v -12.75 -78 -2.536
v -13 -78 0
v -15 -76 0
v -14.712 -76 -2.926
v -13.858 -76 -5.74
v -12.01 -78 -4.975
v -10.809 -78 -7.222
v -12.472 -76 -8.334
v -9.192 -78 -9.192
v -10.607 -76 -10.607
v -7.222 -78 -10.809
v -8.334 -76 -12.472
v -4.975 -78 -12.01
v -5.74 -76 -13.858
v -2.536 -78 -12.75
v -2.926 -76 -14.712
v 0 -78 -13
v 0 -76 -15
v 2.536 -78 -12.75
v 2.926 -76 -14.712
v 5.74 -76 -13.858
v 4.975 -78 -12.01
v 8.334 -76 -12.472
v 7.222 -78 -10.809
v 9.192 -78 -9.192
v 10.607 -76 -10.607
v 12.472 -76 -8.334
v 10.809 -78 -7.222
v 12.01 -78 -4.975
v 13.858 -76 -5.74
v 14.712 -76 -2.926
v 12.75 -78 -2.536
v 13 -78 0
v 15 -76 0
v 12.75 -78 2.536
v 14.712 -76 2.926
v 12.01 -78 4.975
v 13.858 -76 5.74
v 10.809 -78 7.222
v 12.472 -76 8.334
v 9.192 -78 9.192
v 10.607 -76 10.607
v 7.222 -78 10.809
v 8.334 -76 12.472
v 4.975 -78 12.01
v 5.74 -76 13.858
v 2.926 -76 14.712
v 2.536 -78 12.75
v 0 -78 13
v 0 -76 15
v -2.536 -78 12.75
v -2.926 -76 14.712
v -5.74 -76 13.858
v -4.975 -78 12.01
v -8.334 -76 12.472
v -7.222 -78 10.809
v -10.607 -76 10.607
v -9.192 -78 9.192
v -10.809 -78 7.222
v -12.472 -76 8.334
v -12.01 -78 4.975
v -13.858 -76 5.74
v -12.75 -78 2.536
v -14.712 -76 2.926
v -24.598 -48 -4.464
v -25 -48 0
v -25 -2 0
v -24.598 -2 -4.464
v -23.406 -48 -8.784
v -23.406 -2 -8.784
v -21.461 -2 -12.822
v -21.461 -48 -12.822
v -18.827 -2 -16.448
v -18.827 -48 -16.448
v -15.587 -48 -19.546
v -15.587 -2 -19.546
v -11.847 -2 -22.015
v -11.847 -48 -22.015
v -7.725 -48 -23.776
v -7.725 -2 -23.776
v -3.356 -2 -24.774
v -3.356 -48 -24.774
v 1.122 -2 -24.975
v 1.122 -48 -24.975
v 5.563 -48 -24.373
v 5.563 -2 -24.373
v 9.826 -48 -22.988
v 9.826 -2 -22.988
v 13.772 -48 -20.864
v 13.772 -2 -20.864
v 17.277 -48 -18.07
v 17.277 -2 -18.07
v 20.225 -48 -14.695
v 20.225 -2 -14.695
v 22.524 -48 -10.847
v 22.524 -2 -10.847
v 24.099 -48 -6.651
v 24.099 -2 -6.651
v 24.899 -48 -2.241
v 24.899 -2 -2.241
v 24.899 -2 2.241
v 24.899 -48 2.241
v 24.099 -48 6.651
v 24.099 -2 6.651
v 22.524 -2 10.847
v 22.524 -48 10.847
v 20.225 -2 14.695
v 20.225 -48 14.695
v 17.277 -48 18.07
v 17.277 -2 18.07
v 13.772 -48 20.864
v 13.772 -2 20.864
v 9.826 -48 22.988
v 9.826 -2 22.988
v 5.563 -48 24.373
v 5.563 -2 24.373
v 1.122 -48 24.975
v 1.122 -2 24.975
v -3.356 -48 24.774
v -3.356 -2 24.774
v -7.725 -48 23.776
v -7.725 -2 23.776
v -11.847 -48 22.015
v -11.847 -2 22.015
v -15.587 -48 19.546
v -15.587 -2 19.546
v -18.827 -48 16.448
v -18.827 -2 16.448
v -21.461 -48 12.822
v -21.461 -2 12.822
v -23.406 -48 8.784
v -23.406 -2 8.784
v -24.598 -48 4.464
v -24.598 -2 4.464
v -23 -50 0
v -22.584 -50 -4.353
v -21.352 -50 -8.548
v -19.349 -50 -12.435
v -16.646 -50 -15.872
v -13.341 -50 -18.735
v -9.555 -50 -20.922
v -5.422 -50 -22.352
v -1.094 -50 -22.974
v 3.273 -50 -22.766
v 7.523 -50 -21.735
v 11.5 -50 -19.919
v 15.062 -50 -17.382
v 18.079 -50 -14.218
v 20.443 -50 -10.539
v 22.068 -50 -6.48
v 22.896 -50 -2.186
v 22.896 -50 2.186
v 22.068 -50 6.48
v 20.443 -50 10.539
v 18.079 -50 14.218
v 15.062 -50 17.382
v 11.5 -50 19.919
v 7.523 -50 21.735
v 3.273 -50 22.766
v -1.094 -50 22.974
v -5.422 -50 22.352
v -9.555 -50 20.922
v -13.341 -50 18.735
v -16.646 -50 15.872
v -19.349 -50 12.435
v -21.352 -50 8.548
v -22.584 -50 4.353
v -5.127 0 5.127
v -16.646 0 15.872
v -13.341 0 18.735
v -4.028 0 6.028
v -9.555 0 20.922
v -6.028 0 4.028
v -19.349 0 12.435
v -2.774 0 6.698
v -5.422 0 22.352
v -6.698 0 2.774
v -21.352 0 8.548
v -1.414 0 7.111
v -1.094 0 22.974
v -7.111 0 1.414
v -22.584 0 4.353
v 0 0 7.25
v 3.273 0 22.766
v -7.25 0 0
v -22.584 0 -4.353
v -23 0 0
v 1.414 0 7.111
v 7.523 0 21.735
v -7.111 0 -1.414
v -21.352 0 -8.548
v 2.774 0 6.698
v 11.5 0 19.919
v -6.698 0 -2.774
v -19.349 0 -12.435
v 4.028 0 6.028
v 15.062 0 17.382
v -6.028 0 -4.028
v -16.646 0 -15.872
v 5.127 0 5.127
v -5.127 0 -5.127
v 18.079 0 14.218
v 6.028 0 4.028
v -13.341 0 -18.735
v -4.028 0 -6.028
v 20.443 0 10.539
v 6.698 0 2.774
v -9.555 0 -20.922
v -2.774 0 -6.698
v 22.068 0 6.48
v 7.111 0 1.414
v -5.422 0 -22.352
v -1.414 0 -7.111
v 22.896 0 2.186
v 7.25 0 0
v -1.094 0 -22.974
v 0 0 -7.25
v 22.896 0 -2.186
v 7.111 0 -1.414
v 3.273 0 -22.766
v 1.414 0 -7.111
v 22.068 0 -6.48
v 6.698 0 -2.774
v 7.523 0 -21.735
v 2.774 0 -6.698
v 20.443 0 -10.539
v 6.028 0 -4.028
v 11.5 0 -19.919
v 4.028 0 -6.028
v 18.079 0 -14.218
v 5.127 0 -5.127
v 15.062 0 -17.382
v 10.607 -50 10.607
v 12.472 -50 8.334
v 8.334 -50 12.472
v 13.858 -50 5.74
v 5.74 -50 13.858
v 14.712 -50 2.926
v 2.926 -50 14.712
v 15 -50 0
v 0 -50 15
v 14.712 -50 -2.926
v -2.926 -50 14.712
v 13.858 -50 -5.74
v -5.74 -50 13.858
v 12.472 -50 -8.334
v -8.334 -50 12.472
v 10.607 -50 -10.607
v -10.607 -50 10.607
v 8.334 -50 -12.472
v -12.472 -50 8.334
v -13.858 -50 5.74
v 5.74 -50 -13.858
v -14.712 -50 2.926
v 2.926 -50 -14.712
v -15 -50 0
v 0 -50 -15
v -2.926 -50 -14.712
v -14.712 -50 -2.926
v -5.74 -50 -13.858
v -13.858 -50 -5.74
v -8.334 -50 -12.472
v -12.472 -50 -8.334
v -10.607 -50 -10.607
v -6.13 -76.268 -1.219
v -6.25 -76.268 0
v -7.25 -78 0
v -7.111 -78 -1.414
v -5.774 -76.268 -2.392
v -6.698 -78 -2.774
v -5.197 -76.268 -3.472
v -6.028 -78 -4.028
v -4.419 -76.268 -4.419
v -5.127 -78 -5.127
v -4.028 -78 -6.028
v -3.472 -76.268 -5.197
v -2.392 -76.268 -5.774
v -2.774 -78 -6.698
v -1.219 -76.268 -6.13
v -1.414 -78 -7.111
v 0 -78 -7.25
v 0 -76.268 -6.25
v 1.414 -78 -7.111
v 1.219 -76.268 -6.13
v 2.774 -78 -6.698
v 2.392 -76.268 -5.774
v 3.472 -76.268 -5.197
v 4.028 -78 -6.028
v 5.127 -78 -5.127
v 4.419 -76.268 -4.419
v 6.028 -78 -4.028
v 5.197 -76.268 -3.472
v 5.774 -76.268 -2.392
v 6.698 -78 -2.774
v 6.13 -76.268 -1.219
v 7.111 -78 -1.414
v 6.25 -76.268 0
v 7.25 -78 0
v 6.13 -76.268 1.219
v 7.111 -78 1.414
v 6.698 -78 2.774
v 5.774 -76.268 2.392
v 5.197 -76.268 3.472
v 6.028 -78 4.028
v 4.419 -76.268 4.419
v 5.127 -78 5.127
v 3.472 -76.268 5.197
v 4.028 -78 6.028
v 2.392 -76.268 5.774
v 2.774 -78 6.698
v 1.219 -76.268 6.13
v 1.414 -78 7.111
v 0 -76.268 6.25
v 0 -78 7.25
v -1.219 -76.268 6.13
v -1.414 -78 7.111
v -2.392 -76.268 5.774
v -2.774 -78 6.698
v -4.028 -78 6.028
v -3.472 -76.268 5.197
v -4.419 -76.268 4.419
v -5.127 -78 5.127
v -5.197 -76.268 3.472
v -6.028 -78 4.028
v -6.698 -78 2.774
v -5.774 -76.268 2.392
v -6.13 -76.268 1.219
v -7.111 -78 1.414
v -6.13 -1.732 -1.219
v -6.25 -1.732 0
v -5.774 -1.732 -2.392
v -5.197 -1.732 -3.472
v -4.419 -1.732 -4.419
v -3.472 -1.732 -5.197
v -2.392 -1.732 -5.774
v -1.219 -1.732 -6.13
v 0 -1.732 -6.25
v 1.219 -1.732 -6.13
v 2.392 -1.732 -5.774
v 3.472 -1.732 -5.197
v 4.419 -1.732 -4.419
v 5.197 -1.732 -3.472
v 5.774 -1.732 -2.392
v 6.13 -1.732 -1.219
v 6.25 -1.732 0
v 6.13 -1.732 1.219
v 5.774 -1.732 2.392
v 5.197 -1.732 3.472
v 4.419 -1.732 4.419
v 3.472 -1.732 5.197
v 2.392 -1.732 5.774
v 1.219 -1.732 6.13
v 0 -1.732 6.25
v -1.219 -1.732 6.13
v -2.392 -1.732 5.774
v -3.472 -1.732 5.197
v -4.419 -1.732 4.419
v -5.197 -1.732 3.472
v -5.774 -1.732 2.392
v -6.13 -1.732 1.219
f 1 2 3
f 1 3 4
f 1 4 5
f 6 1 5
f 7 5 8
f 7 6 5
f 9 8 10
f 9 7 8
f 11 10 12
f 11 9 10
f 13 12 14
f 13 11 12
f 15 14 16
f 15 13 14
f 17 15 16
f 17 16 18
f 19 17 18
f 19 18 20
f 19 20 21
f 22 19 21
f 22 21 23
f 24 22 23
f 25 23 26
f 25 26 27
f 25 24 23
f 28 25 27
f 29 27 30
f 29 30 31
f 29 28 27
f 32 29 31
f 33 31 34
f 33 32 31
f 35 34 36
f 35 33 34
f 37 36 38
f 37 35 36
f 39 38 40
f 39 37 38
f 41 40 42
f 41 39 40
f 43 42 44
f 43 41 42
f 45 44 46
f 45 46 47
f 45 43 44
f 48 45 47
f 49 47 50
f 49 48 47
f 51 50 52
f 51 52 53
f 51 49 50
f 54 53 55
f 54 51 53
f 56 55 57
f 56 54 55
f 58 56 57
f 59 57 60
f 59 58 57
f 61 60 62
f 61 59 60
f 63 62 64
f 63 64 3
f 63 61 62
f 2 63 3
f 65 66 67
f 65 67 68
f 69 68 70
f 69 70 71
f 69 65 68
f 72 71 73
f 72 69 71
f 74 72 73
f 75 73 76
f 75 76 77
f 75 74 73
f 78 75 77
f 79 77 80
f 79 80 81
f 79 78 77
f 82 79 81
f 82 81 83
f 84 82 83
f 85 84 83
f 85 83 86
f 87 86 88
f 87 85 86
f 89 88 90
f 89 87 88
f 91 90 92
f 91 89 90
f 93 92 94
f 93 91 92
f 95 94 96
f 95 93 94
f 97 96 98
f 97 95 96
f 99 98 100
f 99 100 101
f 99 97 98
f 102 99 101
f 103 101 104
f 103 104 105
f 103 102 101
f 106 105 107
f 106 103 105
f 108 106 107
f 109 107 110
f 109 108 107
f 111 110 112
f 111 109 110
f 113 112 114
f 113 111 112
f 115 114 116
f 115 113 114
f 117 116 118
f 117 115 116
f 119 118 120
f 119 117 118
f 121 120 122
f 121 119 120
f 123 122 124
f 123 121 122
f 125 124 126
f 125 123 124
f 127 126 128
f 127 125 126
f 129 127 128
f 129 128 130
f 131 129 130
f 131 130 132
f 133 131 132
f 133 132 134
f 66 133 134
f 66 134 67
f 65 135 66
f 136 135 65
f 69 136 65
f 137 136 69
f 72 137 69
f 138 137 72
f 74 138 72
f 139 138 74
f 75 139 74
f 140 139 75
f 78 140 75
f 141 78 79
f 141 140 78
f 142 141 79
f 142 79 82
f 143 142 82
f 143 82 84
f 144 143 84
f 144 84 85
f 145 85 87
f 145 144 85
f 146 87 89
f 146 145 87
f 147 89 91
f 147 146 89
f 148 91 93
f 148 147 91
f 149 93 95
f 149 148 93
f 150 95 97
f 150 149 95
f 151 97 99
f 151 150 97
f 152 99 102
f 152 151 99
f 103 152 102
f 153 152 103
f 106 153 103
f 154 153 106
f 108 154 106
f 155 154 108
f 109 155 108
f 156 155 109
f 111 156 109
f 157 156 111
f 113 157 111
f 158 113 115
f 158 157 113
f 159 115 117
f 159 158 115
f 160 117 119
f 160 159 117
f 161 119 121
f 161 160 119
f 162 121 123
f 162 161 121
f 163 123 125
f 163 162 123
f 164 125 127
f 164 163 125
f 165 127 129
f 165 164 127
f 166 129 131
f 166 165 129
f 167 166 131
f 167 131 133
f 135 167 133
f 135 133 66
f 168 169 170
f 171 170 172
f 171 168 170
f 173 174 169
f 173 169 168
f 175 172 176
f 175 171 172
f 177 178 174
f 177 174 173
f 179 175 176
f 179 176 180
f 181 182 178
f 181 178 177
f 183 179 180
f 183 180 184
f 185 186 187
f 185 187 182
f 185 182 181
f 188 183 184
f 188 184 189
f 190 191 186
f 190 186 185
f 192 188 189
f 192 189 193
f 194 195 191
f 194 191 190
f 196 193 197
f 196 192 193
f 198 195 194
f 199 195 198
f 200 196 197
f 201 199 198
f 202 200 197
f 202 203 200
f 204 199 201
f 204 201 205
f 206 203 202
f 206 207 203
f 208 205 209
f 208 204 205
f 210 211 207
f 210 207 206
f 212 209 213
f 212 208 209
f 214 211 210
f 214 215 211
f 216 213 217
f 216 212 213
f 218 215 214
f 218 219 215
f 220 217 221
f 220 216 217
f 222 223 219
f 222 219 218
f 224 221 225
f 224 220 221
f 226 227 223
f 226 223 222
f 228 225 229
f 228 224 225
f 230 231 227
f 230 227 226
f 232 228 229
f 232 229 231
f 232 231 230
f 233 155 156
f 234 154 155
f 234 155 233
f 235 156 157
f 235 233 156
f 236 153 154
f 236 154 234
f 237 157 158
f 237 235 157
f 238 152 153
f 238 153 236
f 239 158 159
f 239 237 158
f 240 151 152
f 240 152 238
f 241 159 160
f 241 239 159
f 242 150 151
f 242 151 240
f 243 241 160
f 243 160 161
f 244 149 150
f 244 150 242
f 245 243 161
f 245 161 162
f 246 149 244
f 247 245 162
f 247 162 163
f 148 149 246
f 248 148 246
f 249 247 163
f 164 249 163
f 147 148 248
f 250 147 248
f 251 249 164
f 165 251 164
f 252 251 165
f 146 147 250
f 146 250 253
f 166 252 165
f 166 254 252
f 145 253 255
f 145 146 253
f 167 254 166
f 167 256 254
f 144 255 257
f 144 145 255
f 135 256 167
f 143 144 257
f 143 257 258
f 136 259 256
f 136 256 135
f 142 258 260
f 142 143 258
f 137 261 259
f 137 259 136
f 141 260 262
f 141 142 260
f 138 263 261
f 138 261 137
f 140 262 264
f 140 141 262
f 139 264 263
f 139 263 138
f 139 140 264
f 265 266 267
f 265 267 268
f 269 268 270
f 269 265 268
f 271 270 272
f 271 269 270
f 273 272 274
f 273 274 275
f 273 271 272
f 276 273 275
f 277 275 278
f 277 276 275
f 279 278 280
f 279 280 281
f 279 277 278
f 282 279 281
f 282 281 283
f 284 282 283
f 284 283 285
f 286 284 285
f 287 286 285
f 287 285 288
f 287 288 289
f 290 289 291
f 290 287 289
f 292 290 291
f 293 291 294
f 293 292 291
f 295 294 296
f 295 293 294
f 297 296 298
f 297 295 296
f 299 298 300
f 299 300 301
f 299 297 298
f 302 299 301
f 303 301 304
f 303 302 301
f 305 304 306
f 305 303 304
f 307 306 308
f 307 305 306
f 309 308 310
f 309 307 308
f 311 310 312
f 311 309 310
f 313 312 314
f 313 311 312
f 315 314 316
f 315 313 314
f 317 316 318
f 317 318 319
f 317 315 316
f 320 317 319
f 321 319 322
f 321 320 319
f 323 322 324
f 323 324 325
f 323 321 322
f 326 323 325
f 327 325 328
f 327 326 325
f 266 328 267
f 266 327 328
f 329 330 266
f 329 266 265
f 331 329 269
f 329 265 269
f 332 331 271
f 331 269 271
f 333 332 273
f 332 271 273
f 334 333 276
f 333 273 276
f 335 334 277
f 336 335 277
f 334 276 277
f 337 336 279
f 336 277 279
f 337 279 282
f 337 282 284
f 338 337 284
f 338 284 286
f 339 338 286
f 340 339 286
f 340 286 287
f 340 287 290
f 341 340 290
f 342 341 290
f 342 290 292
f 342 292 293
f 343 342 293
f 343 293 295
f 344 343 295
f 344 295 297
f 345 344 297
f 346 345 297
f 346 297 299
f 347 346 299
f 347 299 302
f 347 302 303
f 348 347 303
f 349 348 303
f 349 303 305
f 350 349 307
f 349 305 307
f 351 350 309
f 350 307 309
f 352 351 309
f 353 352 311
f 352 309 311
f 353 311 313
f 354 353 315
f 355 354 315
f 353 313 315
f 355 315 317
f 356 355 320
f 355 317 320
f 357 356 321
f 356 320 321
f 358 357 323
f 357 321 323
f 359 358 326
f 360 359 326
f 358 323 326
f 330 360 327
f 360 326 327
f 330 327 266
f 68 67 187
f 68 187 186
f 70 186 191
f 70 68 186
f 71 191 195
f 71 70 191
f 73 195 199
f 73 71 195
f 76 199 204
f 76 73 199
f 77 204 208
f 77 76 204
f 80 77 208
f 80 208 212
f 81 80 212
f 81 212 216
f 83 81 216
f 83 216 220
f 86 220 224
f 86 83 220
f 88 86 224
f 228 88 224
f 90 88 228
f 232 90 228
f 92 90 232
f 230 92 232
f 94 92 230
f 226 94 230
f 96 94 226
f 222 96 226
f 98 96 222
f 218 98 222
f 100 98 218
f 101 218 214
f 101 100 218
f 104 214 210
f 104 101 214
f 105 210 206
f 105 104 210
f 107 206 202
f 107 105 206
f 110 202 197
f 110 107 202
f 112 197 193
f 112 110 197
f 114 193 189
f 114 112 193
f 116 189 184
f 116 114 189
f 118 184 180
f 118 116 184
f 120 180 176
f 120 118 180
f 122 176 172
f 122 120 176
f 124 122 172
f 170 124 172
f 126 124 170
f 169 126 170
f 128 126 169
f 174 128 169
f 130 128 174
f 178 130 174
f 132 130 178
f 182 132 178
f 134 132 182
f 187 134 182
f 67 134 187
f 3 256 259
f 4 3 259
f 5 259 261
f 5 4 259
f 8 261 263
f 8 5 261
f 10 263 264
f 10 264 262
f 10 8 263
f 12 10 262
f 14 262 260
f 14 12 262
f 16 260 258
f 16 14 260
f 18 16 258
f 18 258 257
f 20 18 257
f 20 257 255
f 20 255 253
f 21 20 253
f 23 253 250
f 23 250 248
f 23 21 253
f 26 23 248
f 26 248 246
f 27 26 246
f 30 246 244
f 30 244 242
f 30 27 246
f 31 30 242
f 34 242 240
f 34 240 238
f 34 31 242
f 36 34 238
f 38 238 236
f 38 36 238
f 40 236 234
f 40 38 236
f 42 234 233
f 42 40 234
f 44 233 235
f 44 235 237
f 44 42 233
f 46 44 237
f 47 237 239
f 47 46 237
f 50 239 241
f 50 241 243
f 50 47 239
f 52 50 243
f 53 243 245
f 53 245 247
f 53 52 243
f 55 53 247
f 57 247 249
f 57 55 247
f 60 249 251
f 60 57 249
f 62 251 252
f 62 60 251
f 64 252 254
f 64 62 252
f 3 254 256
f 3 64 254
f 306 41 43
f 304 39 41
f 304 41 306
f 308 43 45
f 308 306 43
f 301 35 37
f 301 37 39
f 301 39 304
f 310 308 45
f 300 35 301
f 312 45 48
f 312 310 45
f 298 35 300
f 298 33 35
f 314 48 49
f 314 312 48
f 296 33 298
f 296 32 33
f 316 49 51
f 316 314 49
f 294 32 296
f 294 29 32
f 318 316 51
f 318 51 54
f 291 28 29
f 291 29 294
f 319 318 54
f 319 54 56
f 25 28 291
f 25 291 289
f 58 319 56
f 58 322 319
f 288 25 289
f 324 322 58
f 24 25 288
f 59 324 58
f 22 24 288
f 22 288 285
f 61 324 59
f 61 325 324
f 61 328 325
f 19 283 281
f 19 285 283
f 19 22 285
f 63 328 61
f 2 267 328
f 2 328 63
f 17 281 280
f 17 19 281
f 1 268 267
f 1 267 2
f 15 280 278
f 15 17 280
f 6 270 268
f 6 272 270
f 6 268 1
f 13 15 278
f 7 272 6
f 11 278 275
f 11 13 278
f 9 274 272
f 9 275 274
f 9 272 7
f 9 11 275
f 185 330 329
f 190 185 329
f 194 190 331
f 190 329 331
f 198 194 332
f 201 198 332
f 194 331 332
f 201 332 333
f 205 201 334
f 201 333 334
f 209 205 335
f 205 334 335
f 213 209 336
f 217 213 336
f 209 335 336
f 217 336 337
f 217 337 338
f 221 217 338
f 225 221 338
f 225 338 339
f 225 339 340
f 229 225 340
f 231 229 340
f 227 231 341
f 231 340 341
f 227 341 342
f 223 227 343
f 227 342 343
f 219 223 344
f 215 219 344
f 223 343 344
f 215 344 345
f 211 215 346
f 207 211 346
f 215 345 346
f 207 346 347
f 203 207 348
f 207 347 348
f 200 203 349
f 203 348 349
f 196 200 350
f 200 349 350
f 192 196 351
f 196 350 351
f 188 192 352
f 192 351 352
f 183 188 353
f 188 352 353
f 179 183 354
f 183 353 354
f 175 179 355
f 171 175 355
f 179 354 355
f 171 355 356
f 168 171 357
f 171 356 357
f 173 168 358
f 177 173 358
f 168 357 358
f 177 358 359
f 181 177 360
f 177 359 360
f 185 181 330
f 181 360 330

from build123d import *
from OCP.BRepFilletAPI import BRepFilletAPI_MakeChamfer

# Parameters (mm, degrees)
CHAMFER1_SIZE                = 2
F_12_5_12_5_DIAMETER_HOLE1_D = 12.5
CHAMFER2_SIZE                = 1
CHAMFER2_SIZE2               = 1.732050808


with BuildPart() as part:
    # Sketch1 → Revolve1 (revolve)
    with BuildSketch(Plane.XY, mode=Mode.PRIVATE) as revolve1_sk:
        Polygon((0, 0), (25, 0), (25, -50), (15, -50), (15, -78), (0, -78), align=None)
    revolve(revolve1_sk.sketch.rotate(Axis((0, 5, 0), (0, -1, 0)), 180), axis=Axis((0, 5, 0), (0, -1, 0)))

    # Chamfer1
    chamfer1_edges = [part.edges().sort_by_distance(p)[0] for p in [
        (15, -78, 0),
        (25, -50, 0),
        (25, 0, 0),
    ]]
    chamfer(chamfer1_edges, length=CHAMFER1_SIZE)

    # Ø12.5 (12.5) Diameter Hole1 (through all)
    with Locations(Plane(origin=(0, 0, 0), x_dir=(1, 0, 0), z_dir=(0, 1, 0))):
        with Locations((0, 0)):
            Hole(F_12_5_12_5_DIAMETER_HOLE1_D / 2)

    # Chamfer2: one chamfer whose edges measure the first distance from different faces: ONE call of the kernel's chamfer builder (chamfer() names one face for all edges)
    chamfer2_edges_1 = [part.edges().sort_by_distance(p)[0] for p in [
        (6.25, 0, 0),
    ]]
    chamfer2_side_1 = [part.faces().sort_by_distance(p)[0] for p in [
        (22.349461761, 0, 0),
    ]]
    chamfer2_edges_2 = [part.edges().sort_by_distance(p)[0] for p in [
        (6.25, -78, 0),
    ]]
    chamfer2_side_2 = [part.faces().sort_by_distance(p)[0] for p in [
        (12.632304474, -78, 0),
    ]]
    chamfer2 = BRepFilletAPI_MakeChamfer(part.part.solid().wrapped)
    for e in chamfer2_edges_1:
        chamfer2.Add(CHAMFER2_SIZE, CHAMFER2_SIZE2, e.wrapped, chamfer2_side_1[0].wrapped)  # the first distance lies on this face
    for e in chamfer2_edges_2:
        chamfer2.Add(CHAMFER2_SIZE, CHAMFER2_SIZE2, e.wrapped, chamfer2_side_2[0].wrapped)  # the first distance lies on this face
    add(Compound.cast(chamfer2.Shape()), mode=Mode.REPLACE)


solid = part.part
